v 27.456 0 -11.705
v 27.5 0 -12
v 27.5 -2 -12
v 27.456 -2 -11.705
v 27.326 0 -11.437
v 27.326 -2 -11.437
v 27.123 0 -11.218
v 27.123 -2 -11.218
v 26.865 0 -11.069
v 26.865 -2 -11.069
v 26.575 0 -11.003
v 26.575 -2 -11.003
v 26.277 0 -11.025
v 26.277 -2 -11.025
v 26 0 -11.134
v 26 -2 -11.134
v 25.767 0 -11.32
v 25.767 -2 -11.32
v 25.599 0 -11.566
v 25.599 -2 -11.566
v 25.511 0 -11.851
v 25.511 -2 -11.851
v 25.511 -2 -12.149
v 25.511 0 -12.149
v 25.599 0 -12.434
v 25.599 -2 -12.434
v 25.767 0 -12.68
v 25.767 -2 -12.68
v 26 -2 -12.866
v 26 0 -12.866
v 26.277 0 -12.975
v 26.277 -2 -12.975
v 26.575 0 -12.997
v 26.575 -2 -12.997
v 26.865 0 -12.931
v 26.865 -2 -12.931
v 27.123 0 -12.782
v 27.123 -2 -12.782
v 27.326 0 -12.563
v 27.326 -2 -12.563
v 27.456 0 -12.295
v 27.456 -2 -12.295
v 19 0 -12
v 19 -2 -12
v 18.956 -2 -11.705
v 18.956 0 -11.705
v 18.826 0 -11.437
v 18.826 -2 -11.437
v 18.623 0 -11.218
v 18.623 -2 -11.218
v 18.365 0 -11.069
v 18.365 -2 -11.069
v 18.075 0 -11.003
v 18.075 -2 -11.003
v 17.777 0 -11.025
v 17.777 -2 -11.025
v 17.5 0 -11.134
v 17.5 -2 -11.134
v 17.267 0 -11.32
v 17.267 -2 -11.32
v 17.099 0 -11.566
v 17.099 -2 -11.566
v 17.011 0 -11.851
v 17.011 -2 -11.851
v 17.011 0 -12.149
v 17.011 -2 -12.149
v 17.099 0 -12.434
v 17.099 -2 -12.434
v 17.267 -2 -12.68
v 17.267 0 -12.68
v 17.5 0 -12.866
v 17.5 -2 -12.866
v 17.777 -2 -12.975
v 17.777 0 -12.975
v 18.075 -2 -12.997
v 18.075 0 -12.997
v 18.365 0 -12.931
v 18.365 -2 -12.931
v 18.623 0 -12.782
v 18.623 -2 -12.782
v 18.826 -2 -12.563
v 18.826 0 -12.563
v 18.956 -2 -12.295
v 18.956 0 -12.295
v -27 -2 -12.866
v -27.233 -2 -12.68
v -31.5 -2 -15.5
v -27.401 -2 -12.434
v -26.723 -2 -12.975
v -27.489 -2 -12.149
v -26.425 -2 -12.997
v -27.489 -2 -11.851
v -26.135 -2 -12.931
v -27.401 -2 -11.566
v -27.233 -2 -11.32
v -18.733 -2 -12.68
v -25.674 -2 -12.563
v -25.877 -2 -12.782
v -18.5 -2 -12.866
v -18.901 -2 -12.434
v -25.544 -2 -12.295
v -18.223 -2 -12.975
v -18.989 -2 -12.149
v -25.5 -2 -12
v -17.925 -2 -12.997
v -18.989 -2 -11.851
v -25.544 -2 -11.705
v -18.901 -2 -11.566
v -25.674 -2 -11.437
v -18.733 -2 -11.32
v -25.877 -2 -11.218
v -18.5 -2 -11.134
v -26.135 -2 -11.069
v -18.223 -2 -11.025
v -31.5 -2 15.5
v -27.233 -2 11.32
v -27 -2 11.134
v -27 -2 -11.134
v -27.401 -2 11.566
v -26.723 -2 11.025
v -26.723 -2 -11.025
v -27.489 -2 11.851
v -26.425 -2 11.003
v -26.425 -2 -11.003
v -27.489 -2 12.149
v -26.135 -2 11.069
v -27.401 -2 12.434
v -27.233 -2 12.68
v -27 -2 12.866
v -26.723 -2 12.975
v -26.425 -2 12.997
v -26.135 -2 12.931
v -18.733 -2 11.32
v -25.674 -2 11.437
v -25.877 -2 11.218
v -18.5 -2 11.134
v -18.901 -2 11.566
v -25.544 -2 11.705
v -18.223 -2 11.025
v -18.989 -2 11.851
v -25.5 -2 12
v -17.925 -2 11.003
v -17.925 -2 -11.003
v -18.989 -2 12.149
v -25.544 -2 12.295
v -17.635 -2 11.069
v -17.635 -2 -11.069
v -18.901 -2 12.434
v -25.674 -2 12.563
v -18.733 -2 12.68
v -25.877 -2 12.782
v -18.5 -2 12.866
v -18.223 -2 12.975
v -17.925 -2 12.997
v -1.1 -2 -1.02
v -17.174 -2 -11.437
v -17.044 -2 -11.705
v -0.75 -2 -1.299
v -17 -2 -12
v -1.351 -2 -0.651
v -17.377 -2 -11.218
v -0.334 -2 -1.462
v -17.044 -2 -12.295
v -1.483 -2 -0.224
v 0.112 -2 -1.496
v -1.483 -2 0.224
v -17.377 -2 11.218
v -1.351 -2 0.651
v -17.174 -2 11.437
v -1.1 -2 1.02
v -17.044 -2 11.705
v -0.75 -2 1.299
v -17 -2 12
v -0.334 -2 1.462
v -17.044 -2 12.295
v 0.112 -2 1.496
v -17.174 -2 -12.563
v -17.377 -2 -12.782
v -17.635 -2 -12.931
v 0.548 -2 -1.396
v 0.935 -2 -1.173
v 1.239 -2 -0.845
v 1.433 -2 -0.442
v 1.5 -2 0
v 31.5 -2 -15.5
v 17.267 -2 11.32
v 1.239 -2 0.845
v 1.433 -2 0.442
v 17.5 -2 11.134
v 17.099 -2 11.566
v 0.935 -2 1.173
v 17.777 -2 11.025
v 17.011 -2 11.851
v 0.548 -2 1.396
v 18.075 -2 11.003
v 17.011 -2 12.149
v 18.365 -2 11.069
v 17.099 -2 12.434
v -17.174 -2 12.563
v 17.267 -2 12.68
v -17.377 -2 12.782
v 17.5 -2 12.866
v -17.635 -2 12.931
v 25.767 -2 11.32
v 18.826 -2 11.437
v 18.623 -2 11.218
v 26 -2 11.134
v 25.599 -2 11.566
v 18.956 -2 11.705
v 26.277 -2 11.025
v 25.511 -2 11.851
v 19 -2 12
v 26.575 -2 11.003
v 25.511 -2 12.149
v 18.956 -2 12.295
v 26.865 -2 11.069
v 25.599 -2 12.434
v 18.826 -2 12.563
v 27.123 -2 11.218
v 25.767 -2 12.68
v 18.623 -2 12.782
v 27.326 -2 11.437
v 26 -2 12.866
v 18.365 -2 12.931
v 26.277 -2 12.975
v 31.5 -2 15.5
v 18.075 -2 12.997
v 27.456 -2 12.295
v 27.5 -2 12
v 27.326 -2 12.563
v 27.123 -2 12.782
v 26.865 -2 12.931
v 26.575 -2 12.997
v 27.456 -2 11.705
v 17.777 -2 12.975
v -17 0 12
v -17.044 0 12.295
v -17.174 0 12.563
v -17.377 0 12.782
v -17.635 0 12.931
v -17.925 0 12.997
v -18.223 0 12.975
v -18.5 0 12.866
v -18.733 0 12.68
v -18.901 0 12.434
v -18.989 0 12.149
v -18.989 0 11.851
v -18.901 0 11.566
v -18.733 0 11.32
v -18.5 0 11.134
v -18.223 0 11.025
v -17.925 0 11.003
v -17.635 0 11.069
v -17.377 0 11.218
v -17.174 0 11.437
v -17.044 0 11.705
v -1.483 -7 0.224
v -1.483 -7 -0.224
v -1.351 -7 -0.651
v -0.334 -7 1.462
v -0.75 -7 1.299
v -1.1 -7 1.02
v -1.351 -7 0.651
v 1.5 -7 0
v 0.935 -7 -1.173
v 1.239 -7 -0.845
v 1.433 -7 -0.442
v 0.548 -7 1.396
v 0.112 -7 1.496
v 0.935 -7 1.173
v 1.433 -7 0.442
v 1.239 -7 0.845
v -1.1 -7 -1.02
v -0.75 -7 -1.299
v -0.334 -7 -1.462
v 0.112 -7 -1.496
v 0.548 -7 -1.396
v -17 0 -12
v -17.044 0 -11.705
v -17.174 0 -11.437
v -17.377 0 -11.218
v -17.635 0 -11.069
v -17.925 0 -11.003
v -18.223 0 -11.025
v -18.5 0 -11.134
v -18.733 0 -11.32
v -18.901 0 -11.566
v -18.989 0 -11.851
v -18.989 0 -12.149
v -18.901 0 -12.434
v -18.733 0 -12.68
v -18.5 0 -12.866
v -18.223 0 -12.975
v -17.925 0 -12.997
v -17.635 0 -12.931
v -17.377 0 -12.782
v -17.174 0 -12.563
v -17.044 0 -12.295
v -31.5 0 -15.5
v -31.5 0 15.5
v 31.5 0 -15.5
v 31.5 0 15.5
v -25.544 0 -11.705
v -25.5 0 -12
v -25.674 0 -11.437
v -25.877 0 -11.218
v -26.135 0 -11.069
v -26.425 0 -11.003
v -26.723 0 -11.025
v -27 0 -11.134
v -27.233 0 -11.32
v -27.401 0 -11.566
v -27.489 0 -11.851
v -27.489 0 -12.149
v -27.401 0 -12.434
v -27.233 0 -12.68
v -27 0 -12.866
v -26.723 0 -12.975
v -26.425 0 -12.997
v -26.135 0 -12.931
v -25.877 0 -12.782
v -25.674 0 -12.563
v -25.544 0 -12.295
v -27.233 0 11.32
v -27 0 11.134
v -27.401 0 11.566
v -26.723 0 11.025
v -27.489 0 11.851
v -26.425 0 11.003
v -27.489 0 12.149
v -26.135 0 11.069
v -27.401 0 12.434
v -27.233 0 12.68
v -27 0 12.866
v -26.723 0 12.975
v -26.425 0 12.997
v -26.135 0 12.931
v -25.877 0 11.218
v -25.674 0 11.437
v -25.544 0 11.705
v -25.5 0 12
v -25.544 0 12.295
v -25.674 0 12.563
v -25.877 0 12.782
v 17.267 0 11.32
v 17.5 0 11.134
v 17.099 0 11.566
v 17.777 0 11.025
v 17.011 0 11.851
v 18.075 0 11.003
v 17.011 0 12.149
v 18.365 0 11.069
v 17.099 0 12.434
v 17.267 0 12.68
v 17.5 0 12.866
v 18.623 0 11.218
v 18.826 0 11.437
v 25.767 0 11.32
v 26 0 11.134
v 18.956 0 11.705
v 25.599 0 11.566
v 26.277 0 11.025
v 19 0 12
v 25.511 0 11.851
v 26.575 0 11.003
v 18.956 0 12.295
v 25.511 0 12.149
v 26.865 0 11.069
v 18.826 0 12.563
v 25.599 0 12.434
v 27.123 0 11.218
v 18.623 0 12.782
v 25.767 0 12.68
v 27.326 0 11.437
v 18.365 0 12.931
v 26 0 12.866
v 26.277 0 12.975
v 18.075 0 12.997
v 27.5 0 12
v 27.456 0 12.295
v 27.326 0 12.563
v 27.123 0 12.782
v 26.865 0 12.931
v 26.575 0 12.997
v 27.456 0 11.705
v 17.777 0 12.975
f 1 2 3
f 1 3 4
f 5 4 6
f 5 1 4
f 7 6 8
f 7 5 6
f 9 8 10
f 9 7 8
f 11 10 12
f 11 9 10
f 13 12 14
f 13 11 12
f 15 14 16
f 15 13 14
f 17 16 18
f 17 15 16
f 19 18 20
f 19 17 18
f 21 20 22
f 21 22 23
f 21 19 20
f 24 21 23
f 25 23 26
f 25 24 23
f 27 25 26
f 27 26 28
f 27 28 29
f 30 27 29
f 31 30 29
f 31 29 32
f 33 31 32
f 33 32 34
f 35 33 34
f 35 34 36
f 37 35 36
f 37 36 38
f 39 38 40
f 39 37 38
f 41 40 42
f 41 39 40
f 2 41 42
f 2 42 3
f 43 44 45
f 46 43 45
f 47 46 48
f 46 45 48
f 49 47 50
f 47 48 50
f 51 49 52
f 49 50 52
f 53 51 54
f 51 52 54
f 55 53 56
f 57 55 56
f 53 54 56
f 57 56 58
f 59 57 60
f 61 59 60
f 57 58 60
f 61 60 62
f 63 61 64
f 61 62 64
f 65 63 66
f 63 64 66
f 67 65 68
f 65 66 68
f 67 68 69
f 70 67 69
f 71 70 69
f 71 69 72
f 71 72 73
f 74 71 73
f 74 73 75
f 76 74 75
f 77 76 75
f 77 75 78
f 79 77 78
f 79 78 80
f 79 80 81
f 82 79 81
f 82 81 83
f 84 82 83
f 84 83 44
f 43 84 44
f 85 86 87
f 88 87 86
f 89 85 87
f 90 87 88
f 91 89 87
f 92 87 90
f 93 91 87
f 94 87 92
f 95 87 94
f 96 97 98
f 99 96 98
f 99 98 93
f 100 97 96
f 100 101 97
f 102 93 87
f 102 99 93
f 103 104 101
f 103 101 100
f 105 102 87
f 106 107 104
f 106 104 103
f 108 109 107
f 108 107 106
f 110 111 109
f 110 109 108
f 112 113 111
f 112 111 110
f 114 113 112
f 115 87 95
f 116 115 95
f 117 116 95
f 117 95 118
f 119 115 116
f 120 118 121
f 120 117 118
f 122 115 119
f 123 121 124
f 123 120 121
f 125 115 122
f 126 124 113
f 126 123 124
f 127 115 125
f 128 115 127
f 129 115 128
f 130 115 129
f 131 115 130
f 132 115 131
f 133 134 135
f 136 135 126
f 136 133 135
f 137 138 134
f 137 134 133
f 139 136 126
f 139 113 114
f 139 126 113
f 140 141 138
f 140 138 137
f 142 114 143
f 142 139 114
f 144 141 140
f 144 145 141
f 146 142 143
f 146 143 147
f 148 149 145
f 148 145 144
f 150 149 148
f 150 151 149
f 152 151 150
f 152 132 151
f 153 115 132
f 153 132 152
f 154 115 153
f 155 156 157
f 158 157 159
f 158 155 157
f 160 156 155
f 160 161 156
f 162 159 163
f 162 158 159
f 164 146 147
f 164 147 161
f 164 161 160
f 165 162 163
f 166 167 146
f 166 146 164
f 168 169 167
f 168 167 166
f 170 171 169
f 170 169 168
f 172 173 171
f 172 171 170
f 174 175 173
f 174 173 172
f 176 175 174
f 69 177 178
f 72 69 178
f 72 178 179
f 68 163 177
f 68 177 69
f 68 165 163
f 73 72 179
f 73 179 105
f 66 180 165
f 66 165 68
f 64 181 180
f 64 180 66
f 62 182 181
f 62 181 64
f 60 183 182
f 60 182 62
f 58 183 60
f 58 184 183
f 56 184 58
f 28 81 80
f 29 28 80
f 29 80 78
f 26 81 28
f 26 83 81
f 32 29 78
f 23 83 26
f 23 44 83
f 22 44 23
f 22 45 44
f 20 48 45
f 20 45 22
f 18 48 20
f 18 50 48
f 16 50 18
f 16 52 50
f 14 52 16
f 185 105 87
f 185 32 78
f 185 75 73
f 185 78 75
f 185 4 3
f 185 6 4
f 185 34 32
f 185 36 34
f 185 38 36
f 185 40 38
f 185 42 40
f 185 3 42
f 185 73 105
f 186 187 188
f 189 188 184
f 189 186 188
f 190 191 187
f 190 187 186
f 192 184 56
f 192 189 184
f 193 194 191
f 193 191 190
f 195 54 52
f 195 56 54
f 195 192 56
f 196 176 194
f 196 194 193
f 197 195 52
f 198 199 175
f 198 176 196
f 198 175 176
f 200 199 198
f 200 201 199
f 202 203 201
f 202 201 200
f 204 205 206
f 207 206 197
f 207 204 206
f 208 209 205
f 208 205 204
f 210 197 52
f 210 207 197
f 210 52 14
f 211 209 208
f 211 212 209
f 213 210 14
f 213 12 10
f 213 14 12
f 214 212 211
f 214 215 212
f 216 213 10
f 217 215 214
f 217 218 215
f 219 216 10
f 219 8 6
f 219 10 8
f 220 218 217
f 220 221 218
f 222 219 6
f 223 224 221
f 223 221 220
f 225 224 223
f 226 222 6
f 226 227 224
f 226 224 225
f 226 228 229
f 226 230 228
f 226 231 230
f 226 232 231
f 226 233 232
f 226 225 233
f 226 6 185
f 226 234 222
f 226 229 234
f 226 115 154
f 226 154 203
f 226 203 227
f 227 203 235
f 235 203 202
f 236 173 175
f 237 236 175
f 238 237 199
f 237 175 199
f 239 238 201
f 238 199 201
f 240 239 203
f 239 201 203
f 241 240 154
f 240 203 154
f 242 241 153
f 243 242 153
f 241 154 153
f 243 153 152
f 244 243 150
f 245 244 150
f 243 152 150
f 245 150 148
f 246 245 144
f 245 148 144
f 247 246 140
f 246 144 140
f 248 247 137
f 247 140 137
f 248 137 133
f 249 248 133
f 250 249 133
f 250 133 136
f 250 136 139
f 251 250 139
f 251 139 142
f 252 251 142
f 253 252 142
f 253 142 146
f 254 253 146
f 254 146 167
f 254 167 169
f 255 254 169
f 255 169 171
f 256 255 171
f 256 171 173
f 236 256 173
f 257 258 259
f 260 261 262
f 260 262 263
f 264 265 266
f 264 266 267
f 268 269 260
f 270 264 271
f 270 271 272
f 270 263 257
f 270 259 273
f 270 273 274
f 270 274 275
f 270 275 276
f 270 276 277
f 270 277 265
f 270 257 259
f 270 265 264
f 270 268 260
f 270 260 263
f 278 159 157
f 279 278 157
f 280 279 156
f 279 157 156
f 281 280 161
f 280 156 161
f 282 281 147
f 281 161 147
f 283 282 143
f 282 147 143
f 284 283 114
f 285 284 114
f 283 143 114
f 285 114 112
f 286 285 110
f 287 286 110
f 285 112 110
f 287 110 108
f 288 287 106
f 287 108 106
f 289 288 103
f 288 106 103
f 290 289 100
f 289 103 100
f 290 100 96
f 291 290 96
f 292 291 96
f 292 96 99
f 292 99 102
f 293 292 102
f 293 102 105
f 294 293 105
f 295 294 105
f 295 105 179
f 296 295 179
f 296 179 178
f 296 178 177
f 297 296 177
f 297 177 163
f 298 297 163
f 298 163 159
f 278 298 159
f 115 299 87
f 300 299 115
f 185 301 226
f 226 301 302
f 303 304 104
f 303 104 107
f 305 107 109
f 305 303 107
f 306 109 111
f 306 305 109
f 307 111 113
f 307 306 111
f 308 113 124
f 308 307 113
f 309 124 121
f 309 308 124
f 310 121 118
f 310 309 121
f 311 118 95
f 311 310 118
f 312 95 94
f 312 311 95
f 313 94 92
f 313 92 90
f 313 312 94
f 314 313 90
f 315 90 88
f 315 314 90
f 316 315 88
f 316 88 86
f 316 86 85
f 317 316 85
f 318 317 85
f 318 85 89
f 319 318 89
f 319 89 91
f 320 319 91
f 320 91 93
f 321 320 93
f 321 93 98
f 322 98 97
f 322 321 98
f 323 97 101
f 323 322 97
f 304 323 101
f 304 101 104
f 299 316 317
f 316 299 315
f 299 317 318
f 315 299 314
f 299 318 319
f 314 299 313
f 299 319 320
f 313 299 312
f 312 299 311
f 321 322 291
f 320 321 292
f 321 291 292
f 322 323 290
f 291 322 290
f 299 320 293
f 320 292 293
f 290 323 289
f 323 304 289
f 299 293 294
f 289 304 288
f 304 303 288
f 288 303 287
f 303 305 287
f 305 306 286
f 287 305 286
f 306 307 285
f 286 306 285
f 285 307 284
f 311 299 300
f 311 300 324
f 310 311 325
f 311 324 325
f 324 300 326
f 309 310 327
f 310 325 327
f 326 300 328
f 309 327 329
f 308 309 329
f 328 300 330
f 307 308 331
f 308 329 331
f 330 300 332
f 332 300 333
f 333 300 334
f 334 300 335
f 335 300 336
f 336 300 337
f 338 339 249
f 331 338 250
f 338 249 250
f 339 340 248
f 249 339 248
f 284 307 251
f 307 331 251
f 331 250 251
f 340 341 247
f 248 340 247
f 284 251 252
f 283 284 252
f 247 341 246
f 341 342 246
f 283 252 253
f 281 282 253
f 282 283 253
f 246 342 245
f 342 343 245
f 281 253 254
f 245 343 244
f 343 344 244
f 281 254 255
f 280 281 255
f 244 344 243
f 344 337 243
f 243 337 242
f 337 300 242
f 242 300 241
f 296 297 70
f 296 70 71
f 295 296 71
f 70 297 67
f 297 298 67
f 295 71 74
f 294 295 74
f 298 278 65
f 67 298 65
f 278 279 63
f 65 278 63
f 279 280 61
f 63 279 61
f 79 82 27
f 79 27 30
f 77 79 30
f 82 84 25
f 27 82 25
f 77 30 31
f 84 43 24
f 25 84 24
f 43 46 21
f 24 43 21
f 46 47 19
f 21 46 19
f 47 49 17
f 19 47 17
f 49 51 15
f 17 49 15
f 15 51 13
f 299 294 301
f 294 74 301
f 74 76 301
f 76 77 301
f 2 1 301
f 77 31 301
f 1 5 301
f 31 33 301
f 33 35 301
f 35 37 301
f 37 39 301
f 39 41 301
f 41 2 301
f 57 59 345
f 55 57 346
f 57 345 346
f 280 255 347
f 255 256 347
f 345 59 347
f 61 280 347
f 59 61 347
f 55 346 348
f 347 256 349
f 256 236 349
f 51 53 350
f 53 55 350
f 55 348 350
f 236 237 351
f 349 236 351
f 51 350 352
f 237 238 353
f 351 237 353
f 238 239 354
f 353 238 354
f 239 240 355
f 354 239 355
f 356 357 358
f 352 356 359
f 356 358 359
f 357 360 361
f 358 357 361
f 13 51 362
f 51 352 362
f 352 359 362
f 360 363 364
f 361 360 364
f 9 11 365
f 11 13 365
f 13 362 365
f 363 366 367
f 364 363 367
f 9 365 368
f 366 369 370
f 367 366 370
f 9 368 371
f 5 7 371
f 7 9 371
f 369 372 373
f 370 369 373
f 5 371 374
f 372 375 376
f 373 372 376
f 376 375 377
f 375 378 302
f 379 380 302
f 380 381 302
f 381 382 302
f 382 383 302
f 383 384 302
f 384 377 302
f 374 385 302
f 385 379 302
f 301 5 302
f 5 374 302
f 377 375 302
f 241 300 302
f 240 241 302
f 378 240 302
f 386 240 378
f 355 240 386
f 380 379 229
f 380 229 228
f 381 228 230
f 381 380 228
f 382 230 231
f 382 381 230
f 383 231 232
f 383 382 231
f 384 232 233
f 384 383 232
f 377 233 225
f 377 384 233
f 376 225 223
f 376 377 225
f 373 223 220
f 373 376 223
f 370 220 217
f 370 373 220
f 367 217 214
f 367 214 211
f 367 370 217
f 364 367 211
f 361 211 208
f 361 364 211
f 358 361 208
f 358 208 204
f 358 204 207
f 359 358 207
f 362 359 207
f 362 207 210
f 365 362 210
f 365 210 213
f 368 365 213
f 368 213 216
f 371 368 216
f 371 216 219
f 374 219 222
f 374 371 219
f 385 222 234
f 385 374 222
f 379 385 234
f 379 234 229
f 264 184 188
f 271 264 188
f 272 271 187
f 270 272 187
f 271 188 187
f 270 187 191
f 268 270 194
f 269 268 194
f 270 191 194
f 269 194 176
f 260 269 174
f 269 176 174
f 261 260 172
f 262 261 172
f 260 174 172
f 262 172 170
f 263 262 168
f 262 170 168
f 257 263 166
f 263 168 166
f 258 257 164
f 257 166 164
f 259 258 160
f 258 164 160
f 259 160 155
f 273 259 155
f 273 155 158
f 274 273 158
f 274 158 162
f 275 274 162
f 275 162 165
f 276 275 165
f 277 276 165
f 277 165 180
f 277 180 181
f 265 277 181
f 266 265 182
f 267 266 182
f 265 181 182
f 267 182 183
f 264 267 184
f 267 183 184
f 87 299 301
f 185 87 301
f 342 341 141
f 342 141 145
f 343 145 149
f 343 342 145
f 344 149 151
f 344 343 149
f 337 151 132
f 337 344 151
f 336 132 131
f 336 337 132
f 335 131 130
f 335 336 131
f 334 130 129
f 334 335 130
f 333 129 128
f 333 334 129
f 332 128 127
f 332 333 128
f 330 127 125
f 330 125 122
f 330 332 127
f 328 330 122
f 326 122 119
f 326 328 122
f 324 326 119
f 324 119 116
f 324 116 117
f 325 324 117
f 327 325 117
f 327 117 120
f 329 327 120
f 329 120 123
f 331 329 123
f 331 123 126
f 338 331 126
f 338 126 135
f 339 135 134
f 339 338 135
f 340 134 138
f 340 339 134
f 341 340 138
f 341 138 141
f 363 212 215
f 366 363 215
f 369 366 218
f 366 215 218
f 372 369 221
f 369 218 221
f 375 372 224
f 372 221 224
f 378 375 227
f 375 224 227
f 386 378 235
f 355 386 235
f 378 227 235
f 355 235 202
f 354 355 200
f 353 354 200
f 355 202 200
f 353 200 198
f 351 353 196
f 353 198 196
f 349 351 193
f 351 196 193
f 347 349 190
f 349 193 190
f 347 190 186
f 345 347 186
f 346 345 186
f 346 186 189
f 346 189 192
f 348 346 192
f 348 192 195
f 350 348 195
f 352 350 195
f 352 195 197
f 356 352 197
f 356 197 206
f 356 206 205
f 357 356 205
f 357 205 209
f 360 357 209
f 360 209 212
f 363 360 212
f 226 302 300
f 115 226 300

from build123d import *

# Parameters (mm, degrees)
F0_W     = 43
F0_H     = 31
F1_DEPTH = 2
F2_R     = 1.5
F3_DEPTH = 5
F4_R     = 1
F5_DEPTH = 2.001
F6_W     = 43
F6_H     = 31
F6_R     = 1
F6_W_2   = 10
F7_DEPTH = 2
F8_DEPTH = 2.001


with BuildPart() as f1:
    # F0 (on Front) → F1 (new body)
    with BuildSketch(Plane.XZ):
        Rectangle(F0_W, F0_H)
    extrude(amount=F1_DEPTH)

    # F2 (on face) → F3 (join)
    with BuildSketch(Plane.XZ.offset(2)):
        Circle(F2_R)
    extrude(amount=F3_DEPTH)

    # F4 (on face) → F5 (cut, through all)
    with BuildSketch(Plane.XZ.offset(2)):
        with Locations((18, 12)):
            Circle(F4_R)
        with Locations((18, -12)):
            Circle(F4_R)
        with Locations((-18, 12)):
            Circle(F4_R)
        with Locations((-18, -12)):
            Circle(F4_R)
    extrude(amount=-F5_DEPTH, mode=Mode.SUBTRACT)

    # F6 (on Front) → F7 (join)
    with BuildSketch(Plane.XZ):
        Rectangle(F6_W, F6_H)
        with Locations((18, 12)):
            Circle(F6_R, mode=Mode.SUBTRACT)
        with Locations((-26.5, 0)):
            Rectangle(F6_W_2, F6_H)
        with Locations((-26.5, -12)):
            Circle(F6_R, mode=Mode.SUBTRACT)
        with Locations((-26.5, 12)):
            Circle(F6_R, mode=Mode.SUBTRACT)
        with Locations((26.5, 0)):
            Rectangle(F6_W_2, F6_H)
        with Locations((26.5, -12)):
            Circle(F6_R, mode=Mode.SUBTRACT)
        with Locations((26.5, 12)):
            Circle(F6_R, mode=Mode.SUBTRACT)
    extrude(amount=F7_DEPTH)

    # F4 (on face) → F8 (cut, through all)
    with BuildSketch(Plane.XZ.offset(2)):
        with Locations((18, 12)):
            Circle(F4_R)
        with Locations((18, -12)):
            Circle(F4_R)
        with Locations((-18, 12)):
            Circle(F4_R)
        with Locations((-18, -12)):
            Circle(F4_R)
    extrude(amount=-F8_DEPTH, mode=Mode.SUBTRACT)


solid = f1.part
